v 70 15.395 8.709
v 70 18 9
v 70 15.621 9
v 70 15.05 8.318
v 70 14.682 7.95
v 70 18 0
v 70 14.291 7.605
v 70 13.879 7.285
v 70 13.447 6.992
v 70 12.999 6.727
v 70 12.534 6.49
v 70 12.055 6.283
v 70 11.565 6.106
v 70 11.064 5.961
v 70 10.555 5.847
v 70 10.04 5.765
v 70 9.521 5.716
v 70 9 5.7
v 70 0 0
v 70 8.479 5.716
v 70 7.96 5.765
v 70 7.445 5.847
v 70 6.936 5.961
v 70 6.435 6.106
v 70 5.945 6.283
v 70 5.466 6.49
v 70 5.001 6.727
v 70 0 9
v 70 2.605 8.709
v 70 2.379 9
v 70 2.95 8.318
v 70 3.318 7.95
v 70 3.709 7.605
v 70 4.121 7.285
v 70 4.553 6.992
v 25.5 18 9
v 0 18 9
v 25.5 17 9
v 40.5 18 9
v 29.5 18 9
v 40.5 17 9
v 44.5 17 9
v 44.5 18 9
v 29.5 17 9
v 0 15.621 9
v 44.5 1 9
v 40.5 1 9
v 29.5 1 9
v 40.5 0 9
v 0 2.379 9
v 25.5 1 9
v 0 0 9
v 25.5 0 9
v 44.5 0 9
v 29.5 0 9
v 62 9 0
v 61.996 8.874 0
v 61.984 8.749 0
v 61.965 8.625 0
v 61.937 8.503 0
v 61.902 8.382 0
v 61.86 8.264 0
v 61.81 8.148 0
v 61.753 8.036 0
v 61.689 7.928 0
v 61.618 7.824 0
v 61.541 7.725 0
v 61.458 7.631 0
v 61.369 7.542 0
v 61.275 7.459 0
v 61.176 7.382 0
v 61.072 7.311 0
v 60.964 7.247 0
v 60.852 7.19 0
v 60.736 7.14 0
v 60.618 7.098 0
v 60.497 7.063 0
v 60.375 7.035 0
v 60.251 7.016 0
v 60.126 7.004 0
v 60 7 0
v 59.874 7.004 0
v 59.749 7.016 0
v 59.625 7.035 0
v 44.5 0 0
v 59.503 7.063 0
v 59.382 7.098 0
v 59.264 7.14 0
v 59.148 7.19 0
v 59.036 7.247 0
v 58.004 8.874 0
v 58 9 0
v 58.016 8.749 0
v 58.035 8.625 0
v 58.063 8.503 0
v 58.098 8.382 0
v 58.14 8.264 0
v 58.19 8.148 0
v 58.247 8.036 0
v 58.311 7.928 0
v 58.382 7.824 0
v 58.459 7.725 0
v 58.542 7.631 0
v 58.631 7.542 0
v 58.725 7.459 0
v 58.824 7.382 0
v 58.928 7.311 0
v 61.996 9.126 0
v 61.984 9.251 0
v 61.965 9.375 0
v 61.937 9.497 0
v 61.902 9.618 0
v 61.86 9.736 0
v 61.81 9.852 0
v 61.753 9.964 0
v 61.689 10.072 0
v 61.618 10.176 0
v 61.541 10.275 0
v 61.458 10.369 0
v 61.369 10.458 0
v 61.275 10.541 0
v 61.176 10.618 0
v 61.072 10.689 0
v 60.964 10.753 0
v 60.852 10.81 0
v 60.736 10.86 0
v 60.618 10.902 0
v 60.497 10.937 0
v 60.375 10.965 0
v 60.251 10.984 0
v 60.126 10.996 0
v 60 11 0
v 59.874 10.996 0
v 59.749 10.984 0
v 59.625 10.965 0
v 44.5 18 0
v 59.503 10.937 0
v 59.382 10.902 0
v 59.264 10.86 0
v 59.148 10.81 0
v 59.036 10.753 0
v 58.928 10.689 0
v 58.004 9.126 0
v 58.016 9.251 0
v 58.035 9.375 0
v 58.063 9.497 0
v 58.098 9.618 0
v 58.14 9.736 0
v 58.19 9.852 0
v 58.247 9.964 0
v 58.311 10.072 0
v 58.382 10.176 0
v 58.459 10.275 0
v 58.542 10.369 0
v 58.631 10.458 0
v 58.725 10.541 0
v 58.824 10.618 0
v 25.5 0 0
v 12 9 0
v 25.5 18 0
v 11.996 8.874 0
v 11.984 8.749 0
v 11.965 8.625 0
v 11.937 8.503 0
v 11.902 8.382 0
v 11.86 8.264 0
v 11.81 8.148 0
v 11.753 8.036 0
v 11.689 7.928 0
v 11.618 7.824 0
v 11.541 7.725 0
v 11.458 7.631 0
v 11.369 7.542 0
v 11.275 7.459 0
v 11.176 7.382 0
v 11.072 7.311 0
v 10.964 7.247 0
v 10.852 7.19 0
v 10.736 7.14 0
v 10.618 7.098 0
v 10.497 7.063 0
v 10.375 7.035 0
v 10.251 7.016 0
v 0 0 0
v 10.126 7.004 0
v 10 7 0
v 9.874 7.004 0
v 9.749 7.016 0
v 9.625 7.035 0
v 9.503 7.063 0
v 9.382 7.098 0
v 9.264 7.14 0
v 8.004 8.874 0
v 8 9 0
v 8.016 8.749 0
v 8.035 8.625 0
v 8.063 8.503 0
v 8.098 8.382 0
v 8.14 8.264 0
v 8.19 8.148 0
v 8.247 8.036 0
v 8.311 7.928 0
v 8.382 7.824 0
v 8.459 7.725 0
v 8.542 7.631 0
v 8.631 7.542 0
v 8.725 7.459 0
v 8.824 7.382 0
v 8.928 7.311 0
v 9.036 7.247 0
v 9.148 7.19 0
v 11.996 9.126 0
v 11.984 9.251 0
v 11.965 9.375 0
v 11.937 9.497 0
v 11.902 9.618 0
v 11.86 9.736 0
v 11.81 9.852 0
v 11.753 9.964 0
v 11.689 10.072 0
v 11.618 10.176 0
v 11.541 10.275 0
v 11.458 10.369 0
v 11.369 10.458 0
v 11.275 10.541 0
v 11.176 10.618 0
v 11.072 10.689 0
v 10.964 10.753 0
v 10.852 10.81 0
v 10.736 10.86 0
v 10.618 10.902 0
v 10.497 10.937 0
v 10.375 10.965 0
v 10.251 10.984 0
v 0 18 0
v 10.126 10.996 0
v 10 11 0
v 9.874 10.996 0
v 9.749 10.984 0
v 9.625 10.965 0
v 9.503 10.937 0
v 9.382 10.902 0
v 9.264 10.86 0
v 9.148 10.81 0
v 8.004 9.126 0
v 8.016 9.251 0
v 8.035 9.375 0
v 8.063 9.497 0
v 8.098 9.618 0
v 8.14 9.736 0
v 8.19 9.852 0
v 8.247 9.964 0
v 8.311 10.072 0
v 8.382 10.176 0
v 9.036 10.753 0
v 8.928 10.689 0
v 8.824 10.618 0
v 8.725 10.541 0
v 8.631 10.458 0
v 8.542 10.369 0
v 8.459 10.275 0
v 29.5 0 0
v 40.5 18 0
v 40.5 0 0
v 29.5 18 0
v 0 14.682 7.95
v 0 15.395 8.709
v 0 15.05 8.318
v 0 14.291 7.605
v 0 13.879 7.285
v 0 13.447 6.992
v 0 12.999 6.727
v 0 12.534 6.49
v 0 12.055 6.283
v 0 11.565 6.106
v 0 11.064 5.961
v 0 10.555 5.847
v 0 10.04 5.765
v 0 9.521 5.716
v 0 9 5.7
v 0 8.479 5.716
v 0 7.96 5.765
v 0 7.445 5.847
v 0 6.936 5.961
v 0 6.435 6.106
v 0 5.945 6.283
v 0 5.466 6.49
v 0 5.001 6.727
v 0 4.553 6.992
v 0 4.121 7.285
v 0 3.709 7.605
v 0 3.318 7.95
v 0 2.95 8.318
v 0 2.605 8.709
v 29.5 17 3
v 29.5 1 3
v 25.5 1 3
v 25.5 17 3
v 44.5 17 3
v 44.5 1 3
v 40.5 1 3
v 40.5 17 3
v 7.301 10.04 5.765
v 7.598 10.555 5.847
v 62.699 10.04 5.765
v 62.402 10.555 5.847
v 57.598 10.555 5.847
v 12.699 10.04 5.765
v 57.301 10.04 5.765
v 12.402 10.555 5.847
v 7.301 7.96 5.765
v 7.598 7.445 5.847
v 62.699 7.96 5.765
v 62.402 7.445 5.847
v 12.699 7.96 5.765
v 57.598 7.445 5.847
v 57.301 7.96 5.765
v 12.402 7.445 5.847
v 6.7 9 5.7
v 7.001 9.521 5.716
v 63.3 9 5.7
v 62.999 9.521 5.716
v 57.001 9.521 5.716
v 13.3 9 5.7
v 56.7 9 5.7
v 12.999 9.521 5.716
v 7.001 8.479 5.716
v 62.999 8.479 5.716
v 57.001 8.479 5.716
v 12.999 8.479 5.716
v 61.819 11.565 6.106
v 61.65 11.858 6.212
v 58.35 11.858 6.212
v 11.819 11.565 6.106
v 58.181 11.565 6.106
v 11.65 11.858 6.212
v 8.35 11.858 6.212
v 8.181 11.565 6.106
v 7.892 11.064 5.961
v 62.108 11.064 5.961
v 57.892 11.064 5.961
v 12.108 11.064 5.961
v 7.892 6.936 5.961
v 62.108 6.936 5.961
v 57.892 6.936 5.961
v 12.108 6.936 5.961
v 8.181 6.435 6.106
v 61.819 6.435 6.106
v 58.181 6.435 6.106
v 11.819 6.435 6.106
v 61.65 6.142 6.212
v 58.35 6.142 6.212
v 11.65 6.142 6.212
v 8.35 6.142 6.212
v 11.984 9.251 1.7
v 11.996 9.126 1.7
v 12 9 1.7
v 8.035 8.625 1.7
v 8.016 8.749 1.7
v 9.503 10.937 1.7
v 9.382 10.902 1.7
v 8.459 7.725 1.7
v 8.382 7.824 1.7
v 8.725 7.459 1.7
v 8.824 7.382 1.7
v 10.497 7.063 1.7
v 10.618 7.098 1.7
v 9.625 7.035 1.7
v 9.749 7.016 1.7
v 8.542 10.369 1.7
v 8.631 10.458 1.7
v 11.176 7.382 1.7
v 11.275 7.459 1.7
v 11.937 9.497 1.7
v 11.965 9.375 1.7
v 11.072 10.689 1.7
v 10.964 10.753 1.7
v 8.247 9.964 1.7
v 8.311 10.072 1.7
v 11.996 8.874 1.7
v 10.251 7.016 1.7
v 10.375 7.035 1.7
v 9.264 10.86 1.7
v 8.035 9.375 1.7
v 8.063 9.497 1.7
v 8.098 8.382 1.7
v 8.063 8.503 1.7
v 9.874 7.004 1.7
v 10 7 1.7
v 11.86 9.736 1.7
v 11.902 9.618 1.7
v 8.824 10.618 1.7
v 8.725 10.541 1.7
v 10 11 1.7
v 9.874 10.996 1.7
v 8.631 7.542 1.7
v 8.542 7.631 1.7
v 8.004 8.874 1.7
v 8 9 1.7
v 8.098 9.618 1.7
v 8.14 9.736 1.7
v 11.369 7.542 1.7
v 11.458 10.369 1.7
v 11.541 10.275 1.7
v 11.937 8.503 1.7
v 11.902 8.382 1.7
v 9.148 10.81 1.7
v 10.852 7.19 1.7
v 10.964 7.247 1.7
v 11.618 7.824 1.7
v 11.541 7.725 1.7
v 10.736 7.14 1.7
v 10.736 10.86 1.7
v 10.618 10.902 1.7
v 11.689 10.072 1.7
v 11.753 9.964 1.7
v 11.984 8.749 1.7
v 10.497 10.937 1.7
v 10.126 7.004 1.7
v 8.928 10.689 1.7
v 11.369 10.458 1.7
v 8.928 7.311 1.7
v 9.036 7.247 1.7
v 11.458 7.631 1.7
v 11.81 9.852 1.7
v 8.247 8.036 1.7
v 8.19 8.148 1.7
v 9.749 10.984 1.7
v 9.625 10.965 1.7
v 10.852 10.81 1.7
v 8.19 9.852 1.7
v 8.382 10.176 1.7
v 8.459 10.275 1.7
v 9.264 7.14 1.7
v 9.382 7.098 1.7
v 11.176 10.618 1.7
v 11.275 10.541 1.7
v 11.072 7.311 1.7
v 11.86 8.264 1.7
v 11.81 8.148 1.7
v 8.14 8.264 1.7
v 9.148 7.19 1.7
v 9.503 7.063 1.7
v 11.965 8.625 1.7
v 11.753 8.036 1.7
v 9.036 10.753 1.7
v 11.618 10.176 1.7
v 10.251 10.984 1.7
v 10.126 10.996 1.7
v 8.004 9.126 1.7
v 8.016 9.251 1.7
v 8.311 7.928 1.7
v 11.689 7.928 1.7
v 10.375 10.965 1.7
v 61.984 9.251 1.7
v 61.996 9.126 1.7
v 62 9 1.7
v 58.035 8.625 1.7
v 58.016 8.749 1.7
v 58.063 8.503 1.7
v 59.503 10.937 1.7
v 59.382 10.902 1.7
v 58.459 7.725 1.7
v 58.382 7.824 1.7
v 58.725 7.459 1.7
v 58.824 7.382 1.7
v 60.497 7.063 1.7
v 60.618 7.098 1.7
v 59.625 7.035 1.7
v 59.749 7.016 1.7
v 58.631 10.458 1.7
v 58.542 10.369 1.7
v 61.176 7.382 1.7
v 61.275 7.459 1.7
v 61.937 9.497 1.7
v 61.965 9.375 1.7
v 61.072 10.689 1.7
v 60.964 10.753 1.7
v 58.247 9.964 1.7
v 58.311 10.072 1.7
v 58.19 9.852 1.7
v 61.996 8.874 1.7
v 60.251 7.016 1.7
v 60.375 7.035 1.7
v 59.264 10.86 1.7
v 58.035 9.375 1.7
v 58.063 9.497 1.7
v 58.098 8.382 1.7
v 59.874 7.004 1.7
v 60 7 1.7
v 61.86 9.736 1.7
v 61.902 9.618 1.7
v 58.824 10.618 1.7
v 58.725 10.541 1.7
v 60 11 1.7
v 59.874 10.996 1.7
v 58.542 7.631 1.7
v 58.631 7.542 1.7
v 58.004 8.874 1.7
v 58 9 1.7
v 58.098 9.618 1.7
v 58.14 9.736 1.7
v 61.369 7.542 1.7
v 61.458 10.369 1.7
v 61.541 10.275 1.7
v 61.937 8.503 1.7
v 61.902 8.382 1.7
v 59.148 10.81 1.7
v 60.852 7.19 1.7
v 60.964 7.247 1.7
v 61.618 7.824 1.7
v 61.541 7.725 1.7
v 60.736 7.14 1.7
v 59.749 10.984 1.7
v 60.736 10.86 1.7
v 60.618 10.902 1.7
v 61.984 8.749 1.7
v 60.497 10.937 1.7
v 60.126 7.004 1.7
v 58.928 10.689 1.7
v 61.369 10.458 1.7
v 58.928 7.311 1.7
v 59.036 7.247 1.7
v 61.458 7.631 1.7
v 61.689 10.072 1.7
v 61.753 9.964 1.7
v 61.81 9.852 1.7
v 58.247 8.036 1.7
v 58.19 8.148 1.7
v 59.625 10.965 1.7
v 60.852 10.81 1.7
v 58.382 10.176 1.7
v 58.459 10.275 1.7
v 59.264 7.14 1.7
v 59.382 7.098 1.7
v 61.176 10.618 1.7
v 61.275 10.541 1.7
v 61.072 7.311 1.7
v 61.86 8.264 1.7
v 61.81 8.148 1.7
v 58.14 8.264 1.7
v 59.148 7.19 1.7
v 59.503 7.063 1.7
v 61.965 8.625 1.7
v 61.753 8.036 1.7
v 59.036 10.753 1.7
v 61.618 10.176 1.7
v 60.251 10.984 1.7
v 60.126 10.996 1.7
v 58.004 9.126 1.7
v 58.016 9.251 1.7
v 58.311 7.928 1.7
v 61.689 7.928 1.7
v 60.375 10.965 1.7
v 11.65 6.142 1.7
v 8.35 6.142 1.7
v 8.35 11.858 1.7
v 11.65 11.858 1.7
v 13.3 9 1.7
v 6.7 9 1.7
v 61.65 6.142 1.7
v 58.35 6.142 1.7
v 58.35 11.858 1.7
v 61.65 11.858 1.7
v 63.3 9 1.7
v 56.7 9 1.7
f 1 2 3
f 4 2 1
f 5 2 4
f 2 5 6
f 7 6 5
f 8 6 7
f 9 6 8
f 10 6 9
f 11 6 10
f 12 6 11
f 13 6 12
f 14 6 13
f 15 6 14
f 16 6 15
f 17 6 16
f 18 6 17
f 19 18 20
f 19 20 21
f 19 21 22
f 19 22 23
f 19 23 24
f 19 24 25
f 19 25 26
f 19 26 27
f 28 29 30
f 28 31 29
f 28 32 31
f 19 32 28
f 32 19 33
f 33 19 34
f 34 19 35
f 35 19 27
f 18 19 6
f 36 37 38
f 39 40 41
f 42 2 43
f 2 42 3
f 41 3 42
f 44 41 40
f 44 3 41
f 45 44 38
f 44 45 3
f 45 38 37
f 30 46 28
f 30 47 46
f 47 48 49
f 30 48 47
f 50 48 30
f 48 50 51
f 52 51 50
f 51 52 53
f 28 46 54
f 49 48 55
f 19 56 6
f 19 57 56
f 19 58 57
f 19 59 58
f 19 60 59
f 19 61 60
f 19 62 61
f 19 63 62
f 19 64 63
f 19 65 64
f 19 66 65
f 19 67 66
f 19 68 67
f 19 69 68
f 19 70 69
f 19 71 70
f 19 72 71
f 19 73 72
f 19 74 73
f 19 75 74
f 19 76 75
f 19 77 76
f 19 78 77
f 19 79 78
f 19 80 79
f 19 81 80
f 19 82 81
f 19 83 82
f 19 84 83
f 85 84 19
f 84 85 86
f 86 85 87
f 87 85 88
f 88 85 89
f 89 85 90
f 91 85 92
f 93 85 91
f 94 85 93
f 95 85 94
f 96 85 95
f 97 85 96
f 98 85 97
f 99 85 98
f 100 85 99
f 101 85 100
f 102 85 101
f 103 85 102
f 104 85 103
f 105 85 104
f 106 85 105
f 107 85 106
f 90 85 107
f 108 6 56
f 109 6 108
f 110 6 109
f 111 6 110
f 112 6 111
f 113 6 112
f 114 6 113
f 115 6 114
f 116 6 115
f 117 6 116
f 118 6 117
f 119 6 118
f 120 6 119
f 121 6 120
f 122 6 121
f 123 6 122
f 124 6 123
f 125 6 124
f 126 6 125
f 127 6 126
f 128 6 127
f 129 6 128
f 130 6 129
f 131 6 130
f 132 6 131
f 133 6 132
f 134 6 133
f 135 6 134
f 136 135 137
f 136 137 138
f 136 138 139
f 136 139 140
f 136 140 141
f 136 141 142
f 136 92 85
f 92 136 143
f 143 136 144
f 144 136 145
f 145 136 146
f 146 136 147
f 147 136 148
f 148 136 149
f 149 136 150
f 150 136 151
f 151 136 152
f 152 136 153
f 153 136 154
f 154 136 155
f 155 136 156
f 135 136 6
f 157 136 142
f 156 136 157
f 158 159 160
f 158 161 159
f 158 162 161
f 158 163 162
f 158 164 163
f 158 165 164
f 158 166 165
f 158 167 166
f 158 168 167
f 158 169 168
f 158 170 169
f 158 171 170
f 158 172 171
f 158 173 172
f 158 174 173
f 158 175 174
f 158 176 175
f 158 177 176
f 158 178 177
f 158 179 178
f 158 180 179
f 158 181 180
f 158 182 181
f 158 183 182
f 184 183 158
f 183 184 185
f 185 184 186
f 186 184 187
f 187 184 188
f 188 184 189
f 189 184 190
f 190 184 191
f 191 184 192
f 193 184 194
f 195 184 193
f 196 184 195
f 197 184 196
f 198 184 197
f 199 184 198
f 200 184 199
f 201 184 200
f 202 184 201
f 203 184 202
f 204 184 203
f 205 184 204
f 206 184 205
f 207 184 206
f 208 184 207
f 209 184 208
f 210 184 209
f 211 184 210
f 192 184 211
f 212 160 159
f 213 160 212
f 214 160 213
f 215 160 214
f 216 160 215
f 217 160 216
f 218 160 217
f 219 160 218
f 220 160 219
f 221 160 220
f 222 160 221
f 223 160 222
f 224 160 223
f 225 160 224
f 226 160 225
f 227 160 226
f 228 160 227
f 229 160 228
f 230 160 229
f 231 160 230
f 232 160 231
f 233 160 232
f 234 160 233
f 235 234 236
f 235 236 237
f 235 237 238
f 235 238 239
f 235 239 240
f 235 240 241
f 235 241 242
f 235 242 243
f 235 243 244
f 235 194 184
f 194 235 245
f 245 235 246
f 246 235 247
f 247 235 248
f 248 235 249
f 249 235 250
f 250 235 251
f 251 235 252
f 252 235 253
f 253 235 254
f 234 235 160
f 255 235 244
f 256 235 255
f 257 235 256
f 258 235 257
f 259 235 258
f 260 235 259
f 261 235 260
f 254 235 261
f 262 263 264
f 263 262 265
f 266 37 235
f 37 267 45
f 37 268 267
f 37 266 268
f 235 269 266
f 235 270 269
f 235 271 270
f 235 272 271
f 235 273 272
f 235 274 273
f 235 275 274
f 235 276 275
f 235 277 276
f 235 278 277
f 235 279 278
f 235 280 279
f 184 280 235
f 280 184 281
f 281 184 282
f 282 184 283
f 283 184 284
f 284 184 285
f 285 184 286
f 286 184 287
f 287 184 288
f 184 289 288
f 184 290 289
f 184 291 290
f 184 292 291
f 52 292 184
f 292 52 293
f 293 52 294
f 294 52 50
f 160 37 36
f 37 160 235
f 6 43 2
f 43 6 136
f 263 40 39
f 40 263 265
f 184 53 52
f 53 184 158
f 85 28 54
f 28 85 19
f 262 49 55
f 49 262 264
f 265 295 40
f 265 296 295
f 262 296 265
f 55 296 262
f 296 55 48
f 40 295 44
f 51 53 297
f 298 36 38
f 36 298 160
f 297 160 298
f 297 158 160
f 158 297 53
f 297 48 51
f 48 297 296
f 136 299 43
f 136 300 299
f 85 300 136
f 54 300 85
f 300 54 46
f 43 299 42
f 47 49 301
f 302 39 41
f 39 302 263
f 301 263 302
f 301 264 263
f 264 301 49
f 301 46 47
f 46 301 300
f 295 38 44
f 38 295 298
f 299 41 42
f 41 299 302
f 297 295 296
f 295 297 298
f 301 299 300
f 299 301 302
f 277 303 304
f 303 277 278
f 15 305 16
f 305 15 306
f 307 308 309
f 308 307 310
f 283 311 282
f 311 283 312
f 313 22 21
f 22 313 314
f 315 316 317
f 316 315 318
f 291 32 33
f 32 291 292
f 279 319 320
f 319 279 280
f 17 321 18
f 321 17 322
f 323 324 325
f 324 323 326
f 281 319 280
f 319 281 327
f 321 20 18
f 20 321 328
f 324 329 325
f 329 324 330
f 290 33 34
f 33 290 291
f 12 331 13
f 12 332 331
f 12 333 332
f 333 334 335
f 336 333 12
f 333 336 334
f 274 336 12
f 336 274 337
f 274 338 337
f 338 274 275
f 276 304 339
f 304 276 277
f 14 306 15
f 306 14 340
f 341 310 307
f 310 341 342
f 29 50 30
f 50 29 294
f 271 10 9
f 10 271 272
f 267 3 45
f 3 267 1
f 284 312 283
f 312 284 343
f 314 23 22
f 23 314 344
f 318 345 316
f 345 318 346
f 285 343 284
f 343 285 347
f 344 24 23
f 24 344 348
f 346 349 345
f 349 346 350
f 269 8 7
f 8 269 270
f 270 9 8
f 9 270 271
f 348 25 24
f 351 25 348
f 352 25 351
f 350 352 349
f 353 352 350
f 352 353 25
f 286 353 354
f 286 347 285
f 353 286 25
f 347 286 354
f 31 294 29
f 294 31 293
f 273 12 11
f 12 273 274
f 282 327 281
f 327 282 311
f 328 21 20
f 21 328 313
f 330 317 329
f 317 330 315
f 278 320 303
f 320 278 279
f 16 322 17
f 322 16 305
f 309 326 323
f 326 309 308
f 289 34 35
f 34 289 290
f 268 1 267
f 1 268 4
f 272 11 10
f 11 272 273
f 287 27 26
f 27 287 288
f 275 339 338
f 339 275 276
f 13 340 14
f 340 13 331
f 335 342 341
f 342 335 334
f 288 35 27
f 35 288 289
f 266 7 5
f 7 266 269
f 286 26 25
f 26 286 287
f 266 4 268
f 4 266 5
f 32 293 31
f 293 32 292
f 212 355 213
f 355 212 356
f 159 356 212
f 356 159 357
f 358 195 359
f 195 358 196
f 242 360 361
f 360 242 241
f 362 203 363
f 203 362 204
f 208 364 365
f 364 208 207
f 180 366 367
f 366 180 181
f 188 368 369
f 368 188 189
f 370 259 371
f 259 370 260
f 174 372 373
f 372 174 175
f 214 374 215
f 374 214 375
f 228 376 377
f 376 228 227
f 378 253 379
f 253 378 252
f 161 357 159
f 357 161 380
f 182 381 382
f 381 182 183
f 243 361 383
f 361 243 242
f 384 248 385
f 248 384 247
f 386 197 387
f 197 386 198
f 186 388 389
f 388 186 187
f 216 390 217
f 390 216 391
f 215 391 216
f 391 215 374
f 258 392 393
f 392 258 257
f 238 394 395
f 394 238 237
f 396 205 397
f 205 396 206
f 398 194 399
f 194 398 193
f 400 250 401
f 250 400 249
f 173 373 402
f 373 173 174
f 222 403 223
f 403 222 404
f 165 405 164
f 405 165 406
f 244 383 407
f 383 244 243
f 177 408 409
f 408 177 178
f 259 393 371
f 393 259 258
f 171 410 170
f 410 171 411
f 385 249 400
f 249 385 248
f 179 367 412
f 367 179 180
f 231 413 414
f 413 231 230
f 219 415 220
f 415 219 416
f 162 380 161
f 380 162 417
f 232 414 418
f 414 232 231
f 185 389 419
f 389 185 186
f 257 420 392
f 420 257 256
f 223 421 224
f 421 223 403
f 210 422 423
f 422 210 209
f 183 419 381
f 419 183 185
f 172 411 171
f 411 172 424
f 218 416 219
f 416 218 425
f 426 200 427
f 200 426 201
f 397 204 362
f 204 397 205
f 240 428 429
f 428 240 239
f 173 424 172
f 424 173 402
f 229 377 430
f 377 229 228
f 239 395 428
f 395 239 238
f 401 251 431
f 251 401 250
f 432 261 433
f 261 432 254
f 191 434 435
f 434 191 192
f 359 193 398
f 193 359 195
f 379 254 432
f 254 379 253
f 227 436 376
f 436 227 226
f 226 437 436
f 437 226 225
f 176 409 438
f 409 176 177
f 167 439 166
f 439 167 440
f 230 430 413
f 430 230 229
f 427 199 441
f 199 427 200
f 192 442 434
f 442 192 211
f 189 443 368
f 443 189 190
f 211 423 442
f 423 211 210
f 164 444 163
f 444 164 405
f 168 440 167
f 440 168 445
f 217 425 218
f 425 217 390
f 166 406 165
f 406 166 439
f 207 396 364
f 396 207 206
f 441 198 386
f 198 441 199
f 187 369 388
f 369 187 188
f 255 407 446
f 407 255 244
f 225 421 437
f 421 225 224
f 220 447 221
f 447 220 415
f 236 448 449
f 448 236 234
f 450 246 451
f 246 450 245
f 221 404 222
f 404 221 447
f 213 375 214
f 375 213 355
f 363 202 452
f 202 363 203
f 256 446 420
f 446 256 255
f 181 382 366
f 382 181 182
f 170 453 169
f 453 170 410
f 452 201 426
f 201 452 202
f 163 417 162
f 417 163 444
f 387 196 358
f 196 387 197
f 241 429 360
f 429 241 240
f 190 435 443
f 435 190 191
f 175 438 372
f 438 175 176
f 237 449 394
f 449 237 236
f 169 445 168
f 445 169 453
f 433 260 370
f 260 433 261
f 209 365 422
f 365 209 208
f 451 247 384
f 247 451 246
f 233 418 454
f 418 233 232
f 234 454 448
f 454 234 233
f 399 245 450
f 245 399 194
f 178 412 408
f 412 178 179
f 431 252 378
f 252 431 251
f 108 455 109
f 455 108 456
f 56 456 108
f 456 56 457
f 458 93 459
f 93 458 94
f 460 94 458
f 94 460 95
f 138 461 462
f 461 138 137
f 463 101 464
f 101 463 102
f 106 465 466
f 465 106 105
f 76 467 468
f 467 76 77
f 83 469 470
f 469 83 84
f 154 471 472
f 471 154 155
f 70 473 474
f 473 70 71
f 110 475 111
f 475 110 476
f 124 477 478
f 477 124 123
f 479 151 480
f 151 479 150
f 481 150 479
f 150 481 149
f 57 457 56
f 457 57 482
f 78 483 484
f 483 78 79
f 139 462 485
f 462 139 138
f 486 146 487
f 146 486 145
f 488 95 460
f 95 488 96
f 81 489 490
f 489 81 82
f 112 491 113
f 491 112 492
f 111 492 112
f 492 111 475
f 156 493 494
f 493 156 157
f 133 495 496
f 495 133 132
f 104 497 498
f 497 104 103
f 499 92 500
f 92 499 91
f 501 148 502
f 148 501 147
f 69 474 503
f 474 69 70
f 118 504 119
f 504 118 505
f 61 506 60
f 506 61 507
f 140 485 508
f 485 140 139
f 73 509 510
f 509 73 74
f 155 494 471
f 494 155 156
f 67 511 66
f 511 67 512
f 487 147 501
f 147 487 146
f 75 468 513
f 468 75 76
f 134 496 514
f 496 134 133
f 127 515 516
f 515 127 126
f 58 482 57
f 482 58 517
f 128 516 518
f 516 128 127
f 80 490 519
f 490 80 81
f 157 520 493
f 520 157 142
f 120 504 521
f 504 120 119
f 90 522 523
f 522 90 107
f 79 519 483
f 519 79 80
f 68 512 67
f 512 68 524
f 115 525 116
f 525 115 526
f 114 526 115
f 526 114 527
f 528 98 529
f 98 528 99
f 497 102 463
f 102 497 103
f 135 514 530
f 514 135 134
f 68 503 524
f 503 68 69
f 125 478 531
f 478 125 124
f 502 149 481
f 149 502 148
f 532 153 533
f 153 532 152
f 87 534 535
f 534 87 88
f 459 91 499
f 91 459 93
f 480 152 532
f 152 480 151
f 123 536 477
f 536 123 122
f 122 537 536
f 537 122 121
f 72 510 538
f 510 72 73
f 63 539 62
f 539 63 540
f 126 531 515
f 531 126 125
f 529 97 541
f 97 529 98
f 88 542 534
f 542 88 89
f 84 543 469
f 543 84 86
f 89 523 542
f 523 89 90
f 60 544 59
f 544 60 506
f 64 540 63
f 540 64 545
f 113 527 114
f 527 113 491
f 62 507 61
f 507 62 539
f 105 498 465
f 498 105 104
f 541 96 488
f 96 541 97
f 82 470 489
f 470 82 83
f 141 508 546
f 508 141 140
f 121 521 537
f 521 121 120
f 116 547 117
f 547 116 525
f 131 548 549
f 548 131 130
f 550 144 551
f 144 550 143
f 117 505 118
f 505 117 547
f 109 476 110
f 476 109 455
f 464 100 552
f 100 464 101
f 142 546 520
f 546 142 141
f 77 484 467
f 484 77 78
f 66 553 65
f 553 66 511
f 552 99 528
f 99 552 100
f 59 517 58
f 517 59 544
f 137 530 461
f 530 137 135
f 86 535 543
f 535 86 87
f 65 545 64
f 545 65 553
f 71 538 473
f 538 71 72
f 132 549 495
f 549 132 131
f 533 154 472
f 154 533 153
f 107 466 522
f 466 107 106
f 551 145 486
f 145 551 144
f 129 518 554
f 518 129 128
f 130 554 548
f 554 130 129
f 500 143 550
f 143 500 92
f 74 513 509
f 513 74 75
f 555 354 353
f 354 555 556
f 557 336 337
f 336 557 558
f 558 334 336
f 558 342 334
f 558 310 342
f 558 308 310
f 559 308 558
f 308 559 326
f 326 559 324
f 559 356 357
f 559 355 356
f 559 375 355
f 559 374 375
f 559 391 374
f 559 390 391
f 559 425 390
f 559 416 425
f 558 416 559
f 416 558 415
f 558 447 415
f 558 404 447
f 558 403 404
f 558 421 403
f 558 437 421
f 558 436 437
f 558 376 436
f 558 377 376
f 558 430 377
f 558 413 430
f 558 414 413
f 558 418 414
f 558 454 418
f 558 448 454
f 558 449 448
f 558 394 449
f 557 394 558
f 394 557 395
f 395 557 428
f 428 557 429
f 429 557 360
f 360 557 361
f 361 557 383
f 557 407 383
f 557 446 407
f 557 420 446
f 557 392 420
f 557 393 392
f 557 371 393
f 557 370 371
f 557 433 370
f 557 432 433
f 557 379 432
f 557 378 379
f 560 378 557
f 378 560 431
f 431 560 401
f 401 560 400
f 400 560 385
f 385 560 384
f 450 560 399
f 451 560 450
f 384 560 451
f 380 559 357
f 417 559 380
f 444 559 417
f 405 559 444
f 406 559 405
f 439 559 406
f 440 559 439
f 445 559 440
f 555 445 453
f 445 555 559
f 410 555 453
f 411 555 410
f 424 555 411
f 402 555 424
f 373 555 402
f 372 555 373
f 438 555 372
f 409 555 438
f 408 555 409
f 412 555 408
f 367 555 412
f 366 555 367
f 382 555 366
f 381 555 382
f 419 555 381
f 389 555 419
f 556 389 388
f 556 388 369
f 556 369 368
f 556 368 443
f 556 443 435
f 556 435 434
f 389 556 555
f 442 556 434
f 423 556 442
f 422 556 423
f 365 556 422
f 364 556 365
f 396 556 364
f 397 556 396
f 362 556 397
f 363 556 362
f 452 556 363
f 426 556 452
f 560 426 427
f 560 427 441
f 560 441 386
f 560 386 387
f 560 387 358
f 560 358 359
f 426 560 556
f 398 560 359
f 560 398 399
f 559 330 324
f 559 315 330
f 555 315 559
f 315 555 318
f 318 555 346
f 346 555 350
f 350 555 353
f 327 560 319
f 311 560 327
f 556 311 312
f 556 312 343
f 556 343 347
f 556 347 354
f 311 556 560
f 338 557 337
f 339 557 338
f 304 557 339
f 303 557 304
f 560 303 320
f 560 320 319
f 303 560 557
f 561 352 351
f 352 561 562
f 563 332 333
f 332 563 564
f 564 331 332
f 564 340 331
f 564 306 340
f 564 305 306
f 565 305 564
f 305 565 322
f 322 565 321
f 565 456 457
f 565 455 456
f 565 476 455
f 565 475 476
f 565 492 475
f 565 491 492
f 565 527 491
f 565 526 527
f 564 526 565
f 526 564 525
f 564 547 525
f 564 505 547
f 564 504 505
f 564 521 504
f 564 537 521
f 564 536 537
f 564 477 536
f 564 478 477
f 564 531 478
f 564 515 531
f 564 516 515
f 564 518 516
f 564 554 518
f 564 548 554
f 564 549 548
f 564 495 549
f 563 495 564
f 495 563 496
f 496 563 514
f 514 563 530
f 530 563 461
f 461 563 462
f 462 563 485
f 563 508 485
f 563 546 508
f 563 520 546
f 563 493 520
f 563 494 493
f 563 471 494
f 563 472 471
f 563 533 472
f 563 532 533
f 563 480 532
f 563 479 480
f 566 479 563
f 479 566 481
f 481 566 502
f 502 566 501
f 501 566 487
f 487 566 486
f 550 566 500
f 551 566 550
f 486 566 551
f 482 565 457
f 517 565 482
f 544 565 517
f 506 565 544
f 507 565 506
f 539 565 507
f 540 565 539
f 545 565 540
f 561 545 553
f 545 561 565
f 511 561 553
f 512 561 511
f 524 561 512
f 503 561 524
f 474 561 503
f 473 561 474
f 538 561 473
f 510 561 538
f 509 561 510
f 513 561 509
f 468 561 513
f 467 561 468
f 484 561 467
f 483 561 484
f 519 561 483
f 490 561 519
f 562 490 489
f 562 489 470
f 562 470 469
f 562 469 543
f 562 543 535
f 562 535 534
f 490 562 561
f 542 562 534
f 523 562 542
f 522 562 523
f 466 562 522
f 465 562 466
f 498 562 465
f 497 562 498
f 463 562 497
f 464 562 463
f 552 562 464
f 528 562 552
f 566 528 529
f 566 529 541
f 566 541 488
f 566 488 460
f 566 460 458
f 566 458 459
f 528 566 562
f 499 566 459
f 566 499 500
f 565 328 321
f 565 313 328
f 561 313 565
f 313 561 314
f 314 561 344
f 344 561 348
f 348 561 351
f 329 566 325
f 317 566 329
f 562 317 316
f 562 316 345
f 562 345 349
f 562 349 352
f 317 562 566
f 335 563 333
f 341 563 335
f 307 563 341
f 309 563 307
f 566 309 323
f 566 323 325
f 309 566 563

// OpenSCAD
r_ecrou_m3=3.3;
l_gorge_collier=1;
r_douille=8;
r_trou_m3=2;

module base_piece(){
difference(){
	cube([ 70, 18, 9 ]);
	
	//passages pour colliers droites
	translate([25.5,0,0]){cube([ 4, l_gorge_collier, 9 ]);}
	translate([40.5,0,0]){cube([ 4, l_gorge_collier, 9 ]);}
	
	//passages pour colliers gauches
	translate([25.5,17,0]){cube([ 4, l_gorge_collier, 9 ]);}
	translate([40.5,17,0]){cube([ 4, l_gorge_collier, 9 ]);}

	//passages pour colliers dessous
	translate([25.5,1,0]){cube([ 4, 16, l_gorge_collier*3 ]);}
	translate([40.5,1,0]){cube([ 4, 16, l_gorge_collier*3 ]);}

	//cylindre pour passage douilles
	translate([-1,9,14]){
		rotate([0,90,0])cylinder(h = 80, r = r_douille+0.3, $fn=100);
	}

	//cylindres pour trous vis
	translate([10,9,0]){cylinder(h = 7, r = r_trou_m3, $fn=100);}
	translate([60,9,0]){cylinder(h = 7, r = r_trou_m3, $fn=100);}
	//hexagones pour écrous
	translate([10,9,1.7]){cylinder(h = 7, r = r_ecrou_m3, $fn=6);}
	translate([60,9,1.7]){cylinder(h = 7, r = r_ecrou_m3, $fn=6);}
}
}
module fix_ventilateur(){
difference(){	
	translate([22,22.5,4.5]){rotate([0,90,0])cylinder(h = 7, r = 4.5, $fn=100);}
	translate([22,22.5,4.5]){rotate([0,90,0])cylinder(h = 10, r = r_trou_m3, $fn=100);}
}
difference(){	
	translate([22,18,0]){cube([ 7, 4.5, 9 ]);}
	translate([22,22.5,4.5]){rotate([0,90,0])cylinder(h = 10, r = 2, $fn=100);}
}
}

base_piece();
//fix_ventilateur();
//translate([19,0,0]){fix_ventilateur();}
